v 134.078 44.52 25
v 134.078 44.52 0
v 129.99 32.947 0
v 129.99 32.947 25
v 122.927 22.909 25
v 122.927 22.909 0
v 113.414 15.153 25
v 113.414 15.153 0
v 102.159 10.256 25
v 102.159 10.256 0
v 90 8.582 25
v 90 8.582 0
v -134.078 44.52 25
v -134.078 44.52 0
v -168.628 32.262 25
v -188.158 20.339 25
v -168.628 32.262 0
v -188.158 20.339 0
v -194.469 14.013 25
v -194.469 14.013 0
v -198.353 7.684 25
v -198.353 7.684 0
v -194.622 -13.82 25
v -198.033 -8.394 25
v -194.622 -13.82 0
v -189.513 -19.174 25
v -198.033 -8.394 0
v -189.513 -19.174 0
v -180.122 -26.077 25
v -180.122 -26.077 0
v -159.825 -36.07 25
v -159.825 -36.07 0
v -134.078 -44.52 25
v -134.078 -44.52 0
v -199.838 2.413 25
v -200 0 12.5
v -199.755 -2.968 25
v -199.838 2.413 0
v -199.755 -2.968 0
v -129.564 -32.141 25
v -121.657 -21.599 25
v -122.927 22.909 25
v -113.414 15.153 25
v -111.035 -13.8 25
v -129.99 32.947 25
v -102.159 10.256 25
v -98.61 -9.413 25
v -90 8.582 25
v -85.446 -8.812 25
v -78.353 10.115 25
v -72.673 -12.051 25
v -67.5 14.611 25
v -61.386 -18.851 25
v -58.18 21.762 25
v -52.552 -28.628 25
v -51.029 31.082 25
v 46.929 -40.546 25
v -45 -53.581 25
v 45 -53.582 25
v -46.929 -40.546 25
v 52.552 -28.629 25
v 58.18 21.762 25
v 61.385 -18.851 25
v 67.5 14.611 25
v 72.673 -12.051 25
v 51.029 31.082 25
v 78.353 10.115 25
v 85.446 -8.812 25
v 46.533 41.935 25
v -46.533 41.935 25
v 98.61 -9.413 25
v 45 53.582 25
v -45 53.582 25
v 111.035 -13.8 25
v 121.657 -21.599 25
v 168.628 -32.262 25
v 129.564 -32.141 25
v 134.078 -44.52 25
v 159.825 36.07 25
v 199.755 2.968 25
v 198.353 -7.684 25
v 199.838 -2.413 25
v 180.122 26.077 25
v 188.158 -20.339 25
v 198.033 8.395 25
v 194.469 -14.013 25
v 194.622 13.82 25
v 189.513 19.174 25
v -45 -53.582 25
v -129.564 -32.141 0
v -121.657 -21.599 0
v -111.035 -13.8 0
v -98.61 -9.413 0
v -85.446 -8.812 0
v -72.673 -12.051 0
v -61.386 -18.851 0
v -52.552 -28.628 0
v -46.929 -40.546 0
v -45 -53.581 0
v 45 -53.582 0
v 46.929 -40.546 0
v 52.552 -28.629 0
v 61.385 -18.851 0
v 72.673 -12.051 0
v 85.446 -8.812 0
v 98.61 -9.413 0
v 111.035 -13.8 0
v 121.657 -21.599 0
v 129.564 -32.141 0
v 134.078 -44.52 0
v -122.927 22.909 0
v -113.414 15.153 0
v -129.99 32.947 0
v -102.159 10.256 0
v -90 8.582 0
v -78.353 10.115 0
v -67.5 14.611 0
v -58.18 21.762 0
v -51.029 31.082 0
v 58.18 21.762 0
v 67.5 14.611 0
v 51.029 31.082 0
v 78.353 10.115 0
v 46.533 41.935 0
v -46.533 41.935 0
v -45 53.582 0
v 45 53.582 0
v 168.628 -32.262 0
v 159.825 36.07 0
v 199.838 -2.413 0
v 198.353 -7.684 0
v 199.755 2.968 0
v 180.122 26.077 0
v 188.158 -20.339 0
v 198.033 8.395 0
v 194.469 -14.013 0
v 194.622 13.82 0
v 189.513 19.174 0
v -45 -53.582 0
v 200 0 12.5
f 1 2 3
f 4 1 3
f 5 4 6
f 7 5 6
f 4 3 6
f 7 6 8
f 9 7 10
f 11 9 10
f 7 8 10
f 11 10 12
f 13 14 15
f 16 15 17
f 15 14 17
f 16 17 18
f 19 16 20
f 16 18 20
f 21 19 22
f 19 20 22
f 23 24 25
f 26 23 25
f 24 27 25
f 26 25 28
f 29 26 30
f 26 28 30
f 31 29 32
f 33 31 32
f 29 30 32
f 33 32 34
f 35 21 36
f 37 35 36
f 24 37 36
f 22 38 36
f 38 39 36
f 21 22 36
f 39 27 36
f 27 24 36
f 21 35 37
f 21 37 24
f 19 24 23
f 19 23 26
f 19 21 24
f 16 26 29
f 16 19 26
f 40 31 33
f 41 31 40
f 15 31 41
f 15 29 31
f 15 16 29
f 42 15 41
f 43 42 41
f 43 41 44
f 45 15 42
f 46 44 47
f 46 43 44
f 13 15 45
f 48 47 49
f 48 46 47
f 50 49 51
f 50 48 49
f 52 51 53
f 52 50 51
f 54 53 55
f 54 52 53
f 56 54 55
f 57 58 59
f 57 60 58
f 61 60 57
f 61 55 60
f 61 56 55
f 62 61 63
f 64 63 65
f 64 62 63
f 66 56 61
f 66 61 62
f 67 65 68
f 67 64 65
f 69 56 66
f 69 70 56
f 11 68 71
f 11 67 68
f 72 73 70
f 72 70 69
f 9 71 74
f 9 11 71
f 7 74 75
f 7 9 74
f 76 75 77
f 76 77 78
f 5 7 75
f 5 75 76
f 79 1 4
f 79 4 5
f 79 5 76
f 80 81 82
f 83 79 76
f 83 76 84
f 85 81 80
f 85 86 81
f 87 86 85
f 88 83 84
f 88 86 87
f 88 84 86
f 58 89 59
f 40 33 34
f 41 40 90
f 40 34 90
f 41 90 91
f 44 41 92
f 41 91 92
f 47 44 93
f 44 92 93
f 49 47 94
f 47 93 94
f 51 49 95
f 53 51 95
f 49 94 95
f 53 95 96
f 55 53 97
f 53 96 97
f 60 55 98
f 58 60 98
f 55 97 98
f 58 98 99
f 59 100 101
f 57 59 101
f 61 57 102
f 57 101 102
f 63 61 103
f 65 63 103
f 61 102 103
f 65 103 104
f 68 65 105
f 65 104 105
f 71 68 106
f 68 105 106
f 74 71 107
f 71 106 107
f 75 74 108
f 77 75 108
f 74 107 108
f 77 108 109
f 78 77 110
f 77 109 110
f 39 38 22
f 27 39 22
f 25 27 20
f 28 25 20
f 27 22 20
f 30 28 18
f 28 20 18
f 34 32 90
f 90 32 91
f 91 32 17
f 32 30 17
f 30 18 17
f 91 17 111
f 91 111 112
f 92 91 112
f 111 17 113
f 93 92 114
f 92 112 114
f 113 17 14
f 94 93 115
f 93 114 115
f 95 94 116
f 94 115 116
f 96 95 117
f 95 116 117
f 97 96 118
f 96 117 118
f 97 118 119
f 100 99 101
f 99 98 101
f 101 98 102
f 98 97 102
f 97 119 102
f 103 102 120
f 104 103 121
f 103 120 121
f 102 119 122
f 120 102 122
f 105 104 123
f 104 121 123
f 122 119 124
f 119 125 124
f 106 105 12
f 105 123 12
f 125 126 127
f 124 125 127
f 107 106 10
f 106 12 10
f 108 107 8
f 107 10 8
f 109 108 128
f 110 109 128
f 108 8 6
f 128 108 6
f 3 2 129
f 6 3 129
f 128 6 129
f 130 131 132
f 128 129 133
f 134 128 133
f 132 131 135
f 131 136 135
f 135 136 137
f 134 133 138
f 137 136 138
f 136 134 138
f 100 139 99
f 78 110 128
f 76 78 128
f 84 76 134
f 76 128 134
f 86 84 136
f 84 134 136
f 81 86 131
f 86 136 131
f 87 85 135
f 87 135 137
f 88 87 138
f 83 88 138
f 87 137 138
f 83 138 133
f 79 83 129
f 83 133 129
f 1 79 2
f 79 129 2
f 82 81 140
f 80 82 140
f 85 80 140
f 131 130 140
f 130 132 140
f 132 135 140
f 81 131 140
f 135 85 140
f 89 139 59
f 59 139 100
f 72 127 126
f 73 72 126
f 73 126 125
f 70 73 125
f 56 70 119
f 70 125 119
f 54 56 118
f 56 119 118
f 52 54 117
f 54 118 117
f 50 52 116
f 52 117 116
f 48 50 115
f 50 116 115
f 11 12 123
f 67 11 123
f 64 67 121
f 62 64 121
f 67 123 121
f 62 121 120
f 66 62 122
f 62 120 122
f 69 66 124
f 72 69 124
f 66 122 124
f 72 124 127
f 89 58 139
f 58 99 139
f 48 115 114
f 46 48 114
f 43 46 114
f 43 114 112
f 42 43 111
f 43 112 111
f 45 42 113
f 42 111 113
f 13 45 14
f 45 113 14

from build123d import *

# Parameters (mm, degrees)
F1_DEPTH = 25


with BuildPart() as f1:
    # F0 (on Top) → F1 (new body)
    with BuildSketch(Plane.XY):
        with BuildLine():
            add(Edge.make_bspline(
                [(-134.0782683535, 44.5204628904), (-199.999999721, 26.6527141895), (-200, 1.885e-07)],
                knots=[2.305532398, 2.305532398, 2.305532398, 3.1415926504, 3.1415926504, 3.1415926504], degree=2, weights=[1, 0.9138904048, 1]))
            add(Edge.make_bspline(
                [(-200, 1.885e-07), (-200.000000279, -26.6526940275), (-134.0783510273, -44.5204404821)],
                knots=[3.1415926504, 3.1415926504, 3.1415926504, 3.9776523521, 3.9776523521, 3.9776523521], degree=2, weights=[1, 0.9138905166, 1]))
            ThreePointArc((-134.0783510273, -44.5204404821), (-118.4364363932, -18.7048054461), (-90, -8.5812887157))
            Line((-90, -8.5812887157), (-90, 8.5817132985))
            ThreePointArc((-90, 8.5817132985), (-118.4362772848, 18.7051003009), (-134.0782683535, 44.5204628904))
        make_face()
        with BuildLine():
            Line((90, -8.5812887157), (90, 8.5817132985))
            ThreePointArc((90, 8.5817132985), (58.1801948466, 21.7619081451), (45, 53.5817132985))
            Line((45, 53.5817132985), (-45, 53.5817132985))
            ThreePointArc((-45, 53.5817132985), (-58.1801948466, 21.7619081451), (-90, 8.5817132985))
            Line((-90, 8.5817132985), (-90, -8.5812887157))
            ThreePointArc((-90, -8.5812887157), (-58.1801948466, -21.7614835623), (-45, -53.5812887157))
            ThreePointArc((-45, -53.5812887157), (-45.0000000005, -53.5815010071), (-45.000000002, -53.5817132985))
            Line((-45.000000002, -53.5817132985), (45.000000002, -53.5817132985))
            ThreePointArc((45.000000002, -53.5817132985), (58.1800447343, -21.7616336753), (90, -8.5812887157))
        make_face()
        with BuildLine():
            add(Edge.make_bspline(
                [(134.0783510273, -44.5204404821), (200, -26.6526941032), (200, 0)],
                knots=[5.4471256087, 5.4471256087, 5.4471256087, 6.2831853072, 6.2831853072, 6.2831853072], degree=2, weights=[1, 0.9138905173, 1]))
            add(Edge.make_bspline(
                [(200, 0), (200, 26.6527141139), (134.0782683535, 44.5204628904)],
                knots=[0, 0, 0, 0.8360602556, 0.8360602556, 0.8360602556], degree=2, weights=[1, 0.9138904042, 1]))
            ThreePointArc((134.0782683535, 44.5204628904), (118.4362772848, 18.7051003009), (90, 8.5817132985))
            Line((90, 8.5817132985), (90, -8.5812887157))
            ThreePointArc((90, -8.5812887157), (118.4364363932, -18.7048054461), (134.0783510273, -44.5204404821))
        make_face()
    extrude(amount=F1_DEPTH)


solid = f1.part
